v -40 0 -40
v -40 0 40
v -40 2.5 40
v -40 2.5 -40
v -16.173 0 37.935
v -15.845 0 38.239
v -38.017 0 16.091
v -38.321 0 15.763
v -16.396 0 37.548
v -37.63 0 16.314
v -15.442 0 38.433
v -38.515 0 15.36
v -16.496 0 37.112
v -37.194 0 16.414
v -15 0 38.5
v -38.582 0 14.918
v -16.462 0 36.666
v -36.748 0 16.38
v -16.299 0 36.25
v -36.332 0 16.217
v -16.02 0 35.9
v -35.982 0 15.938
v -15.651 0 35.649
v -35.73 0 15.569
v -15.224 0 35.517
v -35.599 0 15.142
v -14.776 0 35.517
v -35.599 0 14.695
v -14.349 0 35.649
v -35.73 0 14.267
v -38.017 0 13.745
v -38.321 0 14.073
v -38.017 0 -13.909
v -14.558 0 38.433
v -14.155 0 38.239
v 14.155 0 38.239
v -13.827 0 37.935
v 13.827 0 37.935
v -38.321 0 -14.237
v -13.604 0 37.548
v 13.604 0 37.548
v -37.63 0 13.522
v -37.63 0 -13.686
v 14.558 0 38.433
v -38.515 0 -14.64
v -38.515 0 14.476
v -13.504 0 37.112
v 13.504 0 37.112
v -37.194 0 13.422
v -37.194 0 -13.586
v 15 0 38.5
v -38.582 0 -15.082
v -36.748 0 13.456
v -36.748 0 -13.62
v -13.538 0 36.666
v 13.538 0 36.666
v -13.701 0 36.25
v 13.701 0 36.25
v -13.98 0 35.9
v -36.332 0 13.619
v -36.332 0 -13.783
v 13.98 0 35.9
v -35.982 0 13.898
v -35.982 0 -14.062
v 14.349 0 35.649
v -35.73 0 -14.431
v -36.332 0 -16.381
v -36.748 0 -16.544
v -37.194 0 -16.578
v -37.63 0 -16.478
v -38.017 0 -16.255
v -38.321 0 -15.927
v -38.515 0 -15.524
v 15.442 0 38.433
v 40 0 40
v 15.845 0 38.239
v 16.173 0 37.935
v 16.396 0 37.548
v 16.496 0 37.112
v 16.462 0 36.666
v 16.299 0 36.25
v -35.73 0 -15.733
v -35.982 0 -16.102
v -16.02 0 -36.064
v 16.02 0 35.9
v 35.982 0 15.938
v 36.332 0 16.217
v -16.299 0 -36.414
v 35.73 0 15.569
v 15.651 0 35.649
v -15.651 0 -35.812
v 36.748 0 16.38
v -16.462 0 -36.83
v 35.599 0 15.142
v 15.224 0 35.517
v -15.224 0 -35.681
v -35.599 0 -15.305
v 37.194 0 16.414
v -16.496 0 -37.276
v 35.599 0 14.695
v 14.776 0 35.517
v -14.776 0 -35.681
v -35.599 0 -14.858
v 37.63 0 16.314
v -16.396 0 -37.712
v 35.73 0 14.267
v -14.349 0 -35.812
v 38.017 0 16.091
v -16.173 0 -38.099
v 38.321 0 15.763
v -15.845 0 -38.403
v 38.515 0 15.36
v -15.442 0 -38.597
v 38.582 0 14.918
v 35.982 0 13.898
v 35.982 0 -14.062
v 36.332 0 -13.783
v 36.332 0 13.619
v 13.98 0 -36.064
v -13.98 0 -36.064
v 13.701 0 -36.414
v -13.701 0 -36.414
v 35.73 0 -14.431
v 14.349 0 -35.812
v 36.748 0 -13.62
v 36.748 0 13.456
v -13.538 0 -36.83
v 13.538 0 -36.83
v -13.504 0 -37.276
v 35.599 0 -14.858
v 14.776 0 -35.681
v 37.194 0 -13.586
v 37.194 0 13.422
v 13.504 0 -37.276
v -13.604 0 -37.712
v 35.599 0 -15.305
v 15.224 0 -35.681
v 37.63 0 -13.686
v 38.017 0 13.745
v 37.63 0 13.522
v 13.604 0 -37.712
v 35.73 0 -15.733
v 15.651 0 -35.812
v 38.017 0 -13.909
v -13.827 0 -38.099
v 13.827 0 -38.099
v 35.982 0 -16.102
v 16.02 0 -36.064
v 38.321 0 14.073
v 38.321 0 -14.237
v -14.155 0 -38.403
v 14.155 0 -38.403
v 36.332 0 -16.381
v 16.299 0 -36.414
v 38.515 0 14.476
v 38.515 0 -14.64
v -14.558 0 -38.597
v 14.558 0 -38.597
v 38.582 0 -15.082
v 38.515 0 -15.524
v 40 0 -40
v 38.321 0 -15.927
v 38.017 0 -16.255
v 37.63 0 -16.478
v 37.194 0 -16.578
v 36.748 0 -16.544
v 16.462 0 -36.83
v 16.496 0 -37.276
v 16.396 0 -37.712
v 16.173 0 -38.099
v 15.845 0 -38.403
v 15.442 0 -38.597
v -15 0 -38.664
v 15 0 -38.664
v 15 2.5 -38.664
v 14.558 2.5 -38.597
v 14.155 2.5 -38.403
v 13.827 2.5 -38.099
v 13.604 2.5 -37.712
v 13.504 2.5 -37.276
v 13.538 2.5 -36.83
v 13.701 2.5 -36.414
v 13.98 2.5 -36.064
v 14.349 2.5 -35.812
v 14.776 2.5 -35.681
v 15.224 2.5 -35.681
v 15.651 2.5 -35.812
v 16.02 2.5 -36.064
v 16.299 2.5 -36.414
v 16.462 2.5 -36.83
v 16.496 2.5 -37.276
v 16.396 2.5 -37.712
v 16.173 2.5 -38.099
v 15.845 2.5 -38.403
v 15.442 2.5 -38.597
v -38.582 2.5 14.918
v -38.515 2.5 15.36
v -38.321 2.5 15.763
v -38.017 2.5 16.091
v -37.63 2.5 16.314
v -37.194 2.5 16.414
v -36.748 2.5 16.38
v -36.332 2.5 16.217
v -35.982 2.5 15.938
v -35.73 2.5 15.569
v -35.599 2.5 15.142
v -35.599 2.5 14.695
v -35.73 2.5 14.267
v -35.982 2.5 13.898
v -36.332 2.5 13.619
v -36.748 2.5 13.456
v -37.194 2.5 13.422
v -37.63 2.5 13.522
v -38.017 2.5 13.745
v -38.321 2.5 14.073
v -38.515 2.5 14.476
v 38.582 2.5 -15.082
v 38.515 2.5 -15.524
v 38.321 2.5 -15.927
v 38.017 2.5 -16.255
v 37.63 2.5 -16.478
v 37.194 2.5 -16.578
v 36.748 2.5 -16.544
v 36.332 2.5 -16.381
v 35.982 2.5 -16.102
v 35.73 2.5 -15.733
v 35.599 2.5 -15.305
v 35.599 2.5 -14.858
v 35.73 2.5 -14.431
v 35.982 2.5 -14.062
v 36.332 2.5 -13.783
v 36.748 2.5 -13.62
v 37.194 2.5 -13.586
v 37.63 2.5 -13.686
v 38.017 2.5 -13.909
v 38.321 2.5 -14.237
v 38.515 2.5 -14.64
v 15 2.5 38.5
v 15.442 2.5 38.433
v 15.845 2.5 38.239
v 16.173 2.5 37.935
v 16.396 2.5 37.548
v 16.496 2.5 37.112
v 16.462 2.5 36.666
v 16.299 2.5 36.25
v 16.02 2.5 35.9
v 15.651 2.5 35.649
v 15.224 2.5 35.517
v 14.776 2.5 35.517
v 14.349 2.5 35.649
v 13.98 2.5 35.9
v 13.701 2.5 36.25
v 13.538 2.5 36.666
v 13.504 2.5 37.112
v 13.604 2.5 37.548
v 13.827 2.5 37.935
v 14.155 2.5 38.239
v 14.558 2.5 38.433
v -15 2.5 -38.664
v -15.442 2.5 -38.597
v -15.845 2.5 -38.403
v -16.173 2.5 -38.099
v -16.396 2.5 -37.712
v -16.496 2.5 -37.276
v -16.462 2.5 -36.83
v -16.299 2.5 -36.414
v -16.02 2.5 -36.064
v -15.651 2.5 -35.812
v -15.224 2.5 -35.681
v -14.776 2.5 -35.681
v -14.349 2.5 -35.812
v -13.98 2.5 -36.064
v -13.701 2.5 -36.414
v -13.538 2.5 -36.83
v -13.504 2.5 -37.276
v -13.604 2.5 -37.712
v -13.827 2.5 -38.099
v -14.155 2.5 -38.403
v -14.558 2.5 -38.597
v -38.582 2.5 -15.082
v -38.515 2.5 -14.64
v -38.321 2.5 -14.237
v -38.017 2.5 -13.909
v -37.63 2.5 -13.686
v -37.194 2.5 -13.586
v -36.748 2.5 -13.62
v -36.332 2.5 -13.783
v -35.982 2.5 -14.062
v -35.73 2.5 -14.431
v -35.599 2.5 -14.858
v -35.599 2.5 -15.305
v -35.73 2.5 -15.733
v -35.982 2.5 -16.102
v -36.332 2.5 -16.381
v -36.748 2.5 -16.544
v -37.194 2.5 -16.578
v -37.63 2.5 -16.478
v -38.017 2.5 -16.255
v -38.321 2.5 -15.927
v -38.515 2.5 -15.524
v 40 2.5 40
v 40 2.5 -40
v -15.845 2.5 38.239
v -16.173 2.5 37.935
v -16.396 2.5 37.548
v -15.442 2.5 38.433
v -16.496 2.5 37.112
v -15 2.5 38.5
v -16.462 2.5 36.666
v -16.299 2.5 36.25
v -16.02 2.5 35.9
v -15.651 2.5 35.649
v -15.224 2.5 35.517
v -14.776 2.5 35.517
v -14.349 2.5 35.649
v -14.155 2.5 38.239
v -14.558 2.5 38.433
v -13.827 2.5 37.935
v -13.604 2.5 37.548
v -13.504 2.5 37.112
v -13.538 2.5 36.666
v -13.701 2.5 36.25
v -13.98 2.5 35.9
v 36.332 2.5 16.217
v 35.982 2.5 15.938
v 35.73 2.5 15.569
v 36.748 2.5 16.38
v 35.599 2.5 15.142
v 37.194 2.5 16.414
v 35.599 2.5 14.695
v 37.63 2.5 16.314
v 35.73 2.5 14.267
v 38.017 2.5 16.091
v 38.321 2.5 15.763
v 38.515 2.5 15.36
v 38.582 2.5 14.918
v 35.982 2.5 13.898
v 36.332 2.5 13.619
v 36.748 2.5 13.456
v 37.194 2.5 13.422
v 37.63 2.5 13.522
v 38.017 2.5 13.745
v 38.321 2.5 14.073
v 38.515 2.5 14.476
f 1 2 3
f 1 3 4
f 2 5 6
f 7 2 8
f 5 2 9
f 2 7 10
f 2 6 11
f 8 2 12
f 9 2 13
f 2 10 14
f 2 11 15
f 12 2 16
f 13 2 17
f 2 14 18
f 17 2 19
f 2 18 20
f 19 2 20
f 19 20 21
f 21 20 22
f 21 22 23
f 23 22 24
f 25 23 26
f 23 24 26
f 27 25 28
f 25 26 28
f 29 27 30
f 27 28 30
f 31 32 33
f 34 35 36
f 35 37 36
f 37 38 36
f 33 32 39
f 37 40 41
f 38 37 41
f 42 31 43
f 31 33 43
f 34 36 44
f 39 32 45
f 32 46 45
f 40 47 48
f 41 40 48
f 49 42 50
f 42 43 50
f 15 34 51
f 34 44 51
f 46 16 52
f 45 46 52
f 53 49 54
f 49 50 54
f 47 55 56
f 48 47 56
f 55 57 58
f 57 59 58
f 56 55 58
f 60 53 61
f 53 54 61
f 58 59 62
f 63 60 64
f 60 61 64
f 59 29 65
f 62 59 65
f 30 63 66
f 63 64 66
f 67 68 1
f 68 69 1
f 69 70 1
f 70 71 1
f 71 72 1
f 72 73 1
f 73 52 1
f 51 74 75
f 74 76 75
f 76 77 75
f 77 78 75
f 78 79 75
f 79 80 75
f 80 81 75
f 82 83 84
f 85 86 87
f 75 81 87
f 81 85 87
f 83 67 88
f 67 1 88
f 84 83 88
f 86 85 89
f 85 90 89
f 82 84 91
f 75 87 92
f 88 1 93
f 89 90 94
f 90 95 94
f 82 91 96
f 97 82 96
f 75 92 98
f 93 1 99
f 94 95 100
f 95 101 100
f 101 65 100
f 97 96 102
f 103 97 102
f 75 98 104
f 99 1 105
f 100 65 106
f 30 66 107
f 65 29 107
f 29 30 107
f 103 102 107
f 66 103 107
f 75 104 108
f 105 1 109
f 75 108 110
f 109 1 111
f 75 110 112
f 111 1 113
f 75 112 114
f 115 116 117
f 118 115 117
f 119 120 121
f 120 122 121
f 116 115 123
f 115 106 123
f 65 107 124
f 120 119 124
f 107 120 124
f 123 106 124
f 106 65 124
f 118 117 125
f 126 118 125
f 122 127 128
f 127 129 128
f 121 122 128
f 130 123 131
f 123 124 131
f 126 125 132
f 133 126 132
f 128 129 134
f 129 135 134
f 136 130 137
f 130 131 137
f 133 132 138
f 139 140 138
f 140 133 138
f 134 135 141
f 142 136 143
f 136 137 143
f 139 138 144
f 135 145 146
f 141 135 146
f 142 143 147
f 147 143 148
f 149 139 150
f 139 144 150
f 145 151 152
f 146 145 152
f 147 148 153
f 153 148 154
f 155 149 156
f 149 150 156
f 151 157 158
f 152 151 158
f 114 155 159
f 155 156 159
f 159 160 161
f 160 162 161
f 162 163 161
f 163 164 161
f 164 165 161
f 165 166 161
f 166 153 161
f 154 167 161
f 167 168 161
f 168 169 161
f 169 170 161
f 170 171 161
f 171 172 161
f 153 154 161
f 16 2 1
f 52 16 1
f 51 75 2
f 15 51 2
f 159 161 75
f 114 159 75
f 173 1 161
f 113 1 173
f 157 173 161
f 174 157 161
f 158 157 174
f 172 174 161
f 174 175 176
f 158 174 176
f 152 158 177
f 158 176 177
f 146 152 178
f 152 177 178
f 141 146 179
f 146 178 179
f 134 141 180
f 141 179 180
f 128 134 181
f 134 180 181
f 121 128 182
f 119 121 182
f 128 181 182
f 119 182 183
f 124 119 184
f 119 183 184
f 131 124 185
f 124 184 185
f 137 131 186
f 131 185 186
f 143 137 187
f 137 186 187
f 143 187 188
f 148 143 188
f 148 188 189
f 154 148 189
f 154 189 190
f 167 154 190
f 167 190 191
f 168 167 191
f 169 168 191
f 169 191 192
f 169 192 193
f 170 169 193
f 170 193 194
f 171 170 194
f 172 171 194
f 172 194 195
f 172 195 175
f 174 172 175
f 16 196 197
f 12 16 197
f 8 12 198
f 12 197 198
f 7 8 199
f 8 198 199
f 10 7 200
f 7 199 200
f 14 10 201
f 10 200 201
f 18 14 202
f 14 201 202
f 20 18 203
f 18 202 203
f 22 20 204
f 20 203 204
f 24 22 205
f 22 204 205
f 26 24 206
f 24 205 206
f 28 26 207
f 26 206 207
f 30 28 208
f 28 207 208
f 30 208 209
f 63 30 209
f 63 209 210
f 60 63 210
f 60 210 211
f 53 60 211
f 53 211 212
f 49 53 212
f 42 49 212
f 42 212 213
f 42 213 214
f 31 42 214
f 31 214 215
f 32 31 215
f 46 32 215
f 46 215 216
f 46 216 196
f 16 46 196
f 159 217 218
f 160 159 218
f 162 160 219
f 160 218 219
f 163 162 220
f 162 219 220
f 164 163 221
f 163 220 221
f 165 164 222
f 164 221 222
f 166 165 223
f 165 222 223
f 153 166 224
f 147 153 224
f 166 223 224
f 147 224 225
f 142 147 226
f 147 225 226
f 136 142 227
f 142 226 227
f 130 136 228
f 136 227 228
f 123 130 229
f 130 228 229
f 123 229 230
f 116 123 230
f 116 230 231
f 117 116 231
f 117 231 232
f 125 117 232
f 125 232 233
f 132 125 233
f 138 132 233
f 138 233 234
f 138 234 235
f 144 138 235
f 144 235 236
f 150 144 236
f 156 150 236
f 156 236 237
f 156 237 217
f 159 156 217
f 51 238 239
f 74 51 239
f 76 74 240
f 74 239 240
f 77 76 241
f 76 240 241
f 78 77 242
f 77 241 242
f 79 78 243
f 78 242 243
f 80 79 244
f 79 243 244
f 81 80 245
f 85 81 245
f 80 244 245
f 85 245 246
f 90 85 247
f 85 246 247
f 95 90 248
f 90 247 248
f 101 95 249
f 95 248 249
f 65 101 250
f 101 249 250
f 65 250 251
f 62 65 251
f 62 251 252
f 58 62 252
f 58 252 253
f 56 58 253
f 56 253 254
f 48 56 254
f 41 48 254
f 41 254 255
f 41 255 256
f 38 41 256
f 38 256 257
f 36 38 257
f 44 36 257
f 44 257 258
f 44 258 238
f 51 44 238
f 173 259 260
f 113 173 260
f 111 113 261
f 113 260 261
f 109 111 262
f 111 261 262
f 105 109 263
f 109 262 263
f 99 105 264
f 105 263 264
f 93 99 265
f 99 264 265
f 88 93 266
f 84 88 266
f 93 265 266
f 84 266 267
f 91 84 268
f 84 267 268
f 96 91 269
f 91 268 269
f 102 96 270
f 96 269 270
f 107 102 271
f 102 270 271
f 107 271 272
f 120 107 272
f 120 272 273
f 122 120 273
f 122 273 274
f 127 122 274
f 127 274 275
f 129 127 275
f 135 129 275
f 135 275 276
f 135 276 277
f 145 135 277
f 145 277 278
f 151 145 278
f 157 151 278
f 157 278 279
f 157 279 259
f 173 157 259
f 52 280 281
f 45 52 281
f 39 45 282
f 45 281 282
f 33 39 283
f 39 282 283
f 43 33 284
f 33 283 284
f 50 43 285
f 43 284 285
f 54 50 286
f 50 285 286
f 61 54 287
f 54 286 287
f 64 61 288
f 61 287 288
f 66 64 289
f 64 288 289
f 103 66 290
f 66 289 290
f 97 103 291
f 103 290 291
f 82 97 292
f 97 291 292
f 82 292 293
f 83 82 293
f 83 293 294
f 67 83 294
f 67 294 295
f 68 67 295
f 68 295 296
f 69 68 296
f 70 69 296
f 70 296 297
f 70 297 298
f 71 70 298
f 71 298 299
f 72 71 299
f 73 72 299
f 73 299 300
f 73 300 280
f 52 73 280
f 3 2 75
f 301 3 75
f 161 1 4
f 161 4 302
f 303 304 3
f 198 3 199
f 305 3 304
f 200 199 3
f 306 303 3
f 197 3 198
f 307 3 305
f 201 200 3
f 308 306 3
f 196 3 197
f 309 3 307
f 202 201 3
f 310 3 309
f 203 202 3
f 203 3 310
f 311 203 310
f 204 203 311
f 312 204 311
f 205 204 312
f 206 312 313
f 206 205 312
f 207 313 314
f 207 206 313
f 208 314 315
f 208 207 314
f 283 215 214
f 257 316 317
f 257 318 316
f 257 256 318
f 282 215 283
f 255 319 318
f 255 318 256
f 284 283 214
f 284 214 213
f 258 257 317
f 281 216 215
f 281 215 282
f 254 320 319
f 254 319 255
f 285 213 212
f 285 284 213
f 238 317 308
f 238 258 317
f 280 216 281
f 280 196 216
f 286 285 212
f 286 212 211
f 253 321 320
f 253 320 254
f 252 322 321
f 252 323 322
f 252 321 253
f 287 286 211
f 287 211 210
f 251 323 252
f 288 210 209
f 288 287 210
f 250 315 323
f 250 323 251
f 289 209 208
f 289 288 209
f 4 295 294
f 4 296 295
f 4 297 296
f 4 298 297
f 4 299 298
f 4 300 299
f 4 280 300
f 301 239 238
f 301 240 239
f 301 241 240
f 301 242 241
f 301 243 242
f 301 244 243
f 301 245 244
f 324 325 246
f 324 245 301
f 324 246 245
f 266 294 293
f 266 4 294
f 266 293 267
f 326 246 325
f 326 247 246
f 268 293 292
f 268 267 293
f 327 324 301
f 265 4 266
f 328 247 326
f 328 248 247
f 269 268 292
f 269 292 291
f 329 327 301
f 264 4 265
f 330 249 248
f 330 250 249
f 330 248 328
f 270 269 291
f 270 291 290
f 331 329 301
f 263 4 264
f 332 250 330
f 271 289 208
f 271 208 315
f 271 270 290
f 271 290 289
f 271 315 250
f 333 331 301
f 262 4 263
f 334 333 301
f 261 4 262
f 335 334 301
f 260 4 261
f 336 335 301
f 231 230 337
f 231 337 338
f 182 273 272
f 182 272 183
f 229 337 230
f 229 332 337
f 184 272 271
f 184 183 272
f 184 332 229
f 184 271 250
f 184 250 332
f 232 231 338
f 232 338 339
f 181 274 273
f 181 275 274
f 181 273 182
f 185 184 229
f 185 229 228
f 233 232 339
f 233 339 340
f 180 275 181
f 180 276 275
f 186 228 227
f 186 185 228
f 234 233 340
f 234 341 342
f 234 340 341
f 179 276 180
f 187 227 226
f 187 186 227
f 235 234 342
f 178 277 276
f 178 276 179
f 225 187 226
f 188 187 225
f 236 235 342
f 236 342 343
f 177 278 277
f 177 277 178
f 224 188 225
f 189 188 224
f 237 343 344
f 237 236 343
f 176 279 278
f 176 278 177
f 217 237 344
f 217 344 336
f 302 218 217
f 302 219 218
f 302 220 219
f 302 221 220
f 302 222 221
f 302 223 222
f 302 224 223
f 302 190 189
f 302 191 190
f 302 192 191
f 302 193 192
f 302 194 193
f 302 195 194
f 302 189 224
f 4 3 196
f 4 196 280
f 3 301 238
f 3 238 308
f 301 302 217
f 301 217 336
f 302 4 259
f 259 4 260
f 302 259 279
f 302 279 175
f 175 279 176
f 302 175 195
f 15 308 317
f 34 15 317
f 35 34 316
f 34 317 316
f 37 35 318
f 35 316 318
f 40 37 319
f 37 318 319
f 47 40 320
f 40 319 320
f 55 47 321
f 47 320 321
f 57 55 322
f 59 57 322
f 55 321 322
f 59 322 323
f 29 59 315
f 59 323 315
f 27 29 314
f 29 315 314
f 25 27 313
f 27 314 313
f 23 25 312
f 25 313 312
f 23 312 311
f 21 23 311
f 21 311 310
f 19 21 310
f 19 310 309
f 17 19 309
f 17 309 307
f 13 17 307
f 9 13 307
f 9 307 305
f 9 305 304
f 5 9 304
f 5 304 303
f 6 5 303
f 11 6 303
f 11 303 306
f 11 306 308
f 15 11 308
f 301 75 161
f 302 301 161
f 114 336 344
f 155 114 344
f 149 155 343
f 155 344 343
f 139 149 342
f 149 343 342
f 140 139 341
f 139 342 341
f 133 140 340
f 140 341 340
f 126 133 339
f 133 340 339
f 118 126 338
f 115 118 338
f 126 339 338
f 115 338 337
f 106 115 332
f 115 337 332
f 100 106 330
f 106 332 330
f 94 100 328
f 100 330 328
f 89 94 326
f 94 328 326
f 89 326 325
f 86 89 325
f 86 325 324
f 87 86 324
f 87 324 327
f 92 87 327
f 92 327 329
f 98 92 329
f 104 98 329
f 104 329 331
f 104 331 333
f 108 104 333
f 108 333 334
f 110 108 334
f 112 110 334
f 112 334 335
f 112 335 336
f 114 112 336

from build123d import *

# Parameters (mm, degrees)
SKETCH_1_W               = 80
SKETCH_1_H               = 80
EXTRUDE_1_DEPTH          = 2.5
SKETCH_2_R               = 1.5
CUT_EXTRUDE_1_DEPTH      = 10
PATTERN_CIRCULAR_1_COUNT = 4


with BuildPart() as part:
    # Эскиз1 → Бобышка-Вытянуть1 (new body)
    with BuildSketch(Plane(origin=(0, 0, 0), x_dir=(1, 0, 0), z_dir=(0, 1, 0))):
        Rectangle(SKETCH_1_W, SKETCH_1_H)
    extrude(amount=EXTRUDE_1_DEPTH)

    # Эскиз2 → Вырез-Вытянуть1 (cut)
    with BuildSketch(Plane(origin=(0, 2.5, 0), x_dir=(1, 0, 0), z_dir=(0, 1, 0))):
        with Locations(Location((-15, -37, 0), (0, 0, 270))):
            Circle(SKETCH_2_R)
        with Locations(Location((15, -37, 0), (0, 0, 270))):
            Circle(SKETCH_2_R)
    cut_extrude_1 = extrude(amount=-CUT_EXTRUDE_1_DEPTH, mode=Mode.SUBTRACT)

    # Круговой массив1: Вырез-Вытянуть1 ×4 about axis
    pattern_circular_1_axis = Axis((0, 0, -0.081911433), (0, 1, 0))
    for i in range(1, PATTERN_CIRCULAR_1_COUNT):
        add(cut_extrude_1.rotate(pattern_circular_1_axis, i * 360 / PATTERN_CIRCULAR_1_COUNT), mode=Mode.SUBTRACT)


solid = part.part
